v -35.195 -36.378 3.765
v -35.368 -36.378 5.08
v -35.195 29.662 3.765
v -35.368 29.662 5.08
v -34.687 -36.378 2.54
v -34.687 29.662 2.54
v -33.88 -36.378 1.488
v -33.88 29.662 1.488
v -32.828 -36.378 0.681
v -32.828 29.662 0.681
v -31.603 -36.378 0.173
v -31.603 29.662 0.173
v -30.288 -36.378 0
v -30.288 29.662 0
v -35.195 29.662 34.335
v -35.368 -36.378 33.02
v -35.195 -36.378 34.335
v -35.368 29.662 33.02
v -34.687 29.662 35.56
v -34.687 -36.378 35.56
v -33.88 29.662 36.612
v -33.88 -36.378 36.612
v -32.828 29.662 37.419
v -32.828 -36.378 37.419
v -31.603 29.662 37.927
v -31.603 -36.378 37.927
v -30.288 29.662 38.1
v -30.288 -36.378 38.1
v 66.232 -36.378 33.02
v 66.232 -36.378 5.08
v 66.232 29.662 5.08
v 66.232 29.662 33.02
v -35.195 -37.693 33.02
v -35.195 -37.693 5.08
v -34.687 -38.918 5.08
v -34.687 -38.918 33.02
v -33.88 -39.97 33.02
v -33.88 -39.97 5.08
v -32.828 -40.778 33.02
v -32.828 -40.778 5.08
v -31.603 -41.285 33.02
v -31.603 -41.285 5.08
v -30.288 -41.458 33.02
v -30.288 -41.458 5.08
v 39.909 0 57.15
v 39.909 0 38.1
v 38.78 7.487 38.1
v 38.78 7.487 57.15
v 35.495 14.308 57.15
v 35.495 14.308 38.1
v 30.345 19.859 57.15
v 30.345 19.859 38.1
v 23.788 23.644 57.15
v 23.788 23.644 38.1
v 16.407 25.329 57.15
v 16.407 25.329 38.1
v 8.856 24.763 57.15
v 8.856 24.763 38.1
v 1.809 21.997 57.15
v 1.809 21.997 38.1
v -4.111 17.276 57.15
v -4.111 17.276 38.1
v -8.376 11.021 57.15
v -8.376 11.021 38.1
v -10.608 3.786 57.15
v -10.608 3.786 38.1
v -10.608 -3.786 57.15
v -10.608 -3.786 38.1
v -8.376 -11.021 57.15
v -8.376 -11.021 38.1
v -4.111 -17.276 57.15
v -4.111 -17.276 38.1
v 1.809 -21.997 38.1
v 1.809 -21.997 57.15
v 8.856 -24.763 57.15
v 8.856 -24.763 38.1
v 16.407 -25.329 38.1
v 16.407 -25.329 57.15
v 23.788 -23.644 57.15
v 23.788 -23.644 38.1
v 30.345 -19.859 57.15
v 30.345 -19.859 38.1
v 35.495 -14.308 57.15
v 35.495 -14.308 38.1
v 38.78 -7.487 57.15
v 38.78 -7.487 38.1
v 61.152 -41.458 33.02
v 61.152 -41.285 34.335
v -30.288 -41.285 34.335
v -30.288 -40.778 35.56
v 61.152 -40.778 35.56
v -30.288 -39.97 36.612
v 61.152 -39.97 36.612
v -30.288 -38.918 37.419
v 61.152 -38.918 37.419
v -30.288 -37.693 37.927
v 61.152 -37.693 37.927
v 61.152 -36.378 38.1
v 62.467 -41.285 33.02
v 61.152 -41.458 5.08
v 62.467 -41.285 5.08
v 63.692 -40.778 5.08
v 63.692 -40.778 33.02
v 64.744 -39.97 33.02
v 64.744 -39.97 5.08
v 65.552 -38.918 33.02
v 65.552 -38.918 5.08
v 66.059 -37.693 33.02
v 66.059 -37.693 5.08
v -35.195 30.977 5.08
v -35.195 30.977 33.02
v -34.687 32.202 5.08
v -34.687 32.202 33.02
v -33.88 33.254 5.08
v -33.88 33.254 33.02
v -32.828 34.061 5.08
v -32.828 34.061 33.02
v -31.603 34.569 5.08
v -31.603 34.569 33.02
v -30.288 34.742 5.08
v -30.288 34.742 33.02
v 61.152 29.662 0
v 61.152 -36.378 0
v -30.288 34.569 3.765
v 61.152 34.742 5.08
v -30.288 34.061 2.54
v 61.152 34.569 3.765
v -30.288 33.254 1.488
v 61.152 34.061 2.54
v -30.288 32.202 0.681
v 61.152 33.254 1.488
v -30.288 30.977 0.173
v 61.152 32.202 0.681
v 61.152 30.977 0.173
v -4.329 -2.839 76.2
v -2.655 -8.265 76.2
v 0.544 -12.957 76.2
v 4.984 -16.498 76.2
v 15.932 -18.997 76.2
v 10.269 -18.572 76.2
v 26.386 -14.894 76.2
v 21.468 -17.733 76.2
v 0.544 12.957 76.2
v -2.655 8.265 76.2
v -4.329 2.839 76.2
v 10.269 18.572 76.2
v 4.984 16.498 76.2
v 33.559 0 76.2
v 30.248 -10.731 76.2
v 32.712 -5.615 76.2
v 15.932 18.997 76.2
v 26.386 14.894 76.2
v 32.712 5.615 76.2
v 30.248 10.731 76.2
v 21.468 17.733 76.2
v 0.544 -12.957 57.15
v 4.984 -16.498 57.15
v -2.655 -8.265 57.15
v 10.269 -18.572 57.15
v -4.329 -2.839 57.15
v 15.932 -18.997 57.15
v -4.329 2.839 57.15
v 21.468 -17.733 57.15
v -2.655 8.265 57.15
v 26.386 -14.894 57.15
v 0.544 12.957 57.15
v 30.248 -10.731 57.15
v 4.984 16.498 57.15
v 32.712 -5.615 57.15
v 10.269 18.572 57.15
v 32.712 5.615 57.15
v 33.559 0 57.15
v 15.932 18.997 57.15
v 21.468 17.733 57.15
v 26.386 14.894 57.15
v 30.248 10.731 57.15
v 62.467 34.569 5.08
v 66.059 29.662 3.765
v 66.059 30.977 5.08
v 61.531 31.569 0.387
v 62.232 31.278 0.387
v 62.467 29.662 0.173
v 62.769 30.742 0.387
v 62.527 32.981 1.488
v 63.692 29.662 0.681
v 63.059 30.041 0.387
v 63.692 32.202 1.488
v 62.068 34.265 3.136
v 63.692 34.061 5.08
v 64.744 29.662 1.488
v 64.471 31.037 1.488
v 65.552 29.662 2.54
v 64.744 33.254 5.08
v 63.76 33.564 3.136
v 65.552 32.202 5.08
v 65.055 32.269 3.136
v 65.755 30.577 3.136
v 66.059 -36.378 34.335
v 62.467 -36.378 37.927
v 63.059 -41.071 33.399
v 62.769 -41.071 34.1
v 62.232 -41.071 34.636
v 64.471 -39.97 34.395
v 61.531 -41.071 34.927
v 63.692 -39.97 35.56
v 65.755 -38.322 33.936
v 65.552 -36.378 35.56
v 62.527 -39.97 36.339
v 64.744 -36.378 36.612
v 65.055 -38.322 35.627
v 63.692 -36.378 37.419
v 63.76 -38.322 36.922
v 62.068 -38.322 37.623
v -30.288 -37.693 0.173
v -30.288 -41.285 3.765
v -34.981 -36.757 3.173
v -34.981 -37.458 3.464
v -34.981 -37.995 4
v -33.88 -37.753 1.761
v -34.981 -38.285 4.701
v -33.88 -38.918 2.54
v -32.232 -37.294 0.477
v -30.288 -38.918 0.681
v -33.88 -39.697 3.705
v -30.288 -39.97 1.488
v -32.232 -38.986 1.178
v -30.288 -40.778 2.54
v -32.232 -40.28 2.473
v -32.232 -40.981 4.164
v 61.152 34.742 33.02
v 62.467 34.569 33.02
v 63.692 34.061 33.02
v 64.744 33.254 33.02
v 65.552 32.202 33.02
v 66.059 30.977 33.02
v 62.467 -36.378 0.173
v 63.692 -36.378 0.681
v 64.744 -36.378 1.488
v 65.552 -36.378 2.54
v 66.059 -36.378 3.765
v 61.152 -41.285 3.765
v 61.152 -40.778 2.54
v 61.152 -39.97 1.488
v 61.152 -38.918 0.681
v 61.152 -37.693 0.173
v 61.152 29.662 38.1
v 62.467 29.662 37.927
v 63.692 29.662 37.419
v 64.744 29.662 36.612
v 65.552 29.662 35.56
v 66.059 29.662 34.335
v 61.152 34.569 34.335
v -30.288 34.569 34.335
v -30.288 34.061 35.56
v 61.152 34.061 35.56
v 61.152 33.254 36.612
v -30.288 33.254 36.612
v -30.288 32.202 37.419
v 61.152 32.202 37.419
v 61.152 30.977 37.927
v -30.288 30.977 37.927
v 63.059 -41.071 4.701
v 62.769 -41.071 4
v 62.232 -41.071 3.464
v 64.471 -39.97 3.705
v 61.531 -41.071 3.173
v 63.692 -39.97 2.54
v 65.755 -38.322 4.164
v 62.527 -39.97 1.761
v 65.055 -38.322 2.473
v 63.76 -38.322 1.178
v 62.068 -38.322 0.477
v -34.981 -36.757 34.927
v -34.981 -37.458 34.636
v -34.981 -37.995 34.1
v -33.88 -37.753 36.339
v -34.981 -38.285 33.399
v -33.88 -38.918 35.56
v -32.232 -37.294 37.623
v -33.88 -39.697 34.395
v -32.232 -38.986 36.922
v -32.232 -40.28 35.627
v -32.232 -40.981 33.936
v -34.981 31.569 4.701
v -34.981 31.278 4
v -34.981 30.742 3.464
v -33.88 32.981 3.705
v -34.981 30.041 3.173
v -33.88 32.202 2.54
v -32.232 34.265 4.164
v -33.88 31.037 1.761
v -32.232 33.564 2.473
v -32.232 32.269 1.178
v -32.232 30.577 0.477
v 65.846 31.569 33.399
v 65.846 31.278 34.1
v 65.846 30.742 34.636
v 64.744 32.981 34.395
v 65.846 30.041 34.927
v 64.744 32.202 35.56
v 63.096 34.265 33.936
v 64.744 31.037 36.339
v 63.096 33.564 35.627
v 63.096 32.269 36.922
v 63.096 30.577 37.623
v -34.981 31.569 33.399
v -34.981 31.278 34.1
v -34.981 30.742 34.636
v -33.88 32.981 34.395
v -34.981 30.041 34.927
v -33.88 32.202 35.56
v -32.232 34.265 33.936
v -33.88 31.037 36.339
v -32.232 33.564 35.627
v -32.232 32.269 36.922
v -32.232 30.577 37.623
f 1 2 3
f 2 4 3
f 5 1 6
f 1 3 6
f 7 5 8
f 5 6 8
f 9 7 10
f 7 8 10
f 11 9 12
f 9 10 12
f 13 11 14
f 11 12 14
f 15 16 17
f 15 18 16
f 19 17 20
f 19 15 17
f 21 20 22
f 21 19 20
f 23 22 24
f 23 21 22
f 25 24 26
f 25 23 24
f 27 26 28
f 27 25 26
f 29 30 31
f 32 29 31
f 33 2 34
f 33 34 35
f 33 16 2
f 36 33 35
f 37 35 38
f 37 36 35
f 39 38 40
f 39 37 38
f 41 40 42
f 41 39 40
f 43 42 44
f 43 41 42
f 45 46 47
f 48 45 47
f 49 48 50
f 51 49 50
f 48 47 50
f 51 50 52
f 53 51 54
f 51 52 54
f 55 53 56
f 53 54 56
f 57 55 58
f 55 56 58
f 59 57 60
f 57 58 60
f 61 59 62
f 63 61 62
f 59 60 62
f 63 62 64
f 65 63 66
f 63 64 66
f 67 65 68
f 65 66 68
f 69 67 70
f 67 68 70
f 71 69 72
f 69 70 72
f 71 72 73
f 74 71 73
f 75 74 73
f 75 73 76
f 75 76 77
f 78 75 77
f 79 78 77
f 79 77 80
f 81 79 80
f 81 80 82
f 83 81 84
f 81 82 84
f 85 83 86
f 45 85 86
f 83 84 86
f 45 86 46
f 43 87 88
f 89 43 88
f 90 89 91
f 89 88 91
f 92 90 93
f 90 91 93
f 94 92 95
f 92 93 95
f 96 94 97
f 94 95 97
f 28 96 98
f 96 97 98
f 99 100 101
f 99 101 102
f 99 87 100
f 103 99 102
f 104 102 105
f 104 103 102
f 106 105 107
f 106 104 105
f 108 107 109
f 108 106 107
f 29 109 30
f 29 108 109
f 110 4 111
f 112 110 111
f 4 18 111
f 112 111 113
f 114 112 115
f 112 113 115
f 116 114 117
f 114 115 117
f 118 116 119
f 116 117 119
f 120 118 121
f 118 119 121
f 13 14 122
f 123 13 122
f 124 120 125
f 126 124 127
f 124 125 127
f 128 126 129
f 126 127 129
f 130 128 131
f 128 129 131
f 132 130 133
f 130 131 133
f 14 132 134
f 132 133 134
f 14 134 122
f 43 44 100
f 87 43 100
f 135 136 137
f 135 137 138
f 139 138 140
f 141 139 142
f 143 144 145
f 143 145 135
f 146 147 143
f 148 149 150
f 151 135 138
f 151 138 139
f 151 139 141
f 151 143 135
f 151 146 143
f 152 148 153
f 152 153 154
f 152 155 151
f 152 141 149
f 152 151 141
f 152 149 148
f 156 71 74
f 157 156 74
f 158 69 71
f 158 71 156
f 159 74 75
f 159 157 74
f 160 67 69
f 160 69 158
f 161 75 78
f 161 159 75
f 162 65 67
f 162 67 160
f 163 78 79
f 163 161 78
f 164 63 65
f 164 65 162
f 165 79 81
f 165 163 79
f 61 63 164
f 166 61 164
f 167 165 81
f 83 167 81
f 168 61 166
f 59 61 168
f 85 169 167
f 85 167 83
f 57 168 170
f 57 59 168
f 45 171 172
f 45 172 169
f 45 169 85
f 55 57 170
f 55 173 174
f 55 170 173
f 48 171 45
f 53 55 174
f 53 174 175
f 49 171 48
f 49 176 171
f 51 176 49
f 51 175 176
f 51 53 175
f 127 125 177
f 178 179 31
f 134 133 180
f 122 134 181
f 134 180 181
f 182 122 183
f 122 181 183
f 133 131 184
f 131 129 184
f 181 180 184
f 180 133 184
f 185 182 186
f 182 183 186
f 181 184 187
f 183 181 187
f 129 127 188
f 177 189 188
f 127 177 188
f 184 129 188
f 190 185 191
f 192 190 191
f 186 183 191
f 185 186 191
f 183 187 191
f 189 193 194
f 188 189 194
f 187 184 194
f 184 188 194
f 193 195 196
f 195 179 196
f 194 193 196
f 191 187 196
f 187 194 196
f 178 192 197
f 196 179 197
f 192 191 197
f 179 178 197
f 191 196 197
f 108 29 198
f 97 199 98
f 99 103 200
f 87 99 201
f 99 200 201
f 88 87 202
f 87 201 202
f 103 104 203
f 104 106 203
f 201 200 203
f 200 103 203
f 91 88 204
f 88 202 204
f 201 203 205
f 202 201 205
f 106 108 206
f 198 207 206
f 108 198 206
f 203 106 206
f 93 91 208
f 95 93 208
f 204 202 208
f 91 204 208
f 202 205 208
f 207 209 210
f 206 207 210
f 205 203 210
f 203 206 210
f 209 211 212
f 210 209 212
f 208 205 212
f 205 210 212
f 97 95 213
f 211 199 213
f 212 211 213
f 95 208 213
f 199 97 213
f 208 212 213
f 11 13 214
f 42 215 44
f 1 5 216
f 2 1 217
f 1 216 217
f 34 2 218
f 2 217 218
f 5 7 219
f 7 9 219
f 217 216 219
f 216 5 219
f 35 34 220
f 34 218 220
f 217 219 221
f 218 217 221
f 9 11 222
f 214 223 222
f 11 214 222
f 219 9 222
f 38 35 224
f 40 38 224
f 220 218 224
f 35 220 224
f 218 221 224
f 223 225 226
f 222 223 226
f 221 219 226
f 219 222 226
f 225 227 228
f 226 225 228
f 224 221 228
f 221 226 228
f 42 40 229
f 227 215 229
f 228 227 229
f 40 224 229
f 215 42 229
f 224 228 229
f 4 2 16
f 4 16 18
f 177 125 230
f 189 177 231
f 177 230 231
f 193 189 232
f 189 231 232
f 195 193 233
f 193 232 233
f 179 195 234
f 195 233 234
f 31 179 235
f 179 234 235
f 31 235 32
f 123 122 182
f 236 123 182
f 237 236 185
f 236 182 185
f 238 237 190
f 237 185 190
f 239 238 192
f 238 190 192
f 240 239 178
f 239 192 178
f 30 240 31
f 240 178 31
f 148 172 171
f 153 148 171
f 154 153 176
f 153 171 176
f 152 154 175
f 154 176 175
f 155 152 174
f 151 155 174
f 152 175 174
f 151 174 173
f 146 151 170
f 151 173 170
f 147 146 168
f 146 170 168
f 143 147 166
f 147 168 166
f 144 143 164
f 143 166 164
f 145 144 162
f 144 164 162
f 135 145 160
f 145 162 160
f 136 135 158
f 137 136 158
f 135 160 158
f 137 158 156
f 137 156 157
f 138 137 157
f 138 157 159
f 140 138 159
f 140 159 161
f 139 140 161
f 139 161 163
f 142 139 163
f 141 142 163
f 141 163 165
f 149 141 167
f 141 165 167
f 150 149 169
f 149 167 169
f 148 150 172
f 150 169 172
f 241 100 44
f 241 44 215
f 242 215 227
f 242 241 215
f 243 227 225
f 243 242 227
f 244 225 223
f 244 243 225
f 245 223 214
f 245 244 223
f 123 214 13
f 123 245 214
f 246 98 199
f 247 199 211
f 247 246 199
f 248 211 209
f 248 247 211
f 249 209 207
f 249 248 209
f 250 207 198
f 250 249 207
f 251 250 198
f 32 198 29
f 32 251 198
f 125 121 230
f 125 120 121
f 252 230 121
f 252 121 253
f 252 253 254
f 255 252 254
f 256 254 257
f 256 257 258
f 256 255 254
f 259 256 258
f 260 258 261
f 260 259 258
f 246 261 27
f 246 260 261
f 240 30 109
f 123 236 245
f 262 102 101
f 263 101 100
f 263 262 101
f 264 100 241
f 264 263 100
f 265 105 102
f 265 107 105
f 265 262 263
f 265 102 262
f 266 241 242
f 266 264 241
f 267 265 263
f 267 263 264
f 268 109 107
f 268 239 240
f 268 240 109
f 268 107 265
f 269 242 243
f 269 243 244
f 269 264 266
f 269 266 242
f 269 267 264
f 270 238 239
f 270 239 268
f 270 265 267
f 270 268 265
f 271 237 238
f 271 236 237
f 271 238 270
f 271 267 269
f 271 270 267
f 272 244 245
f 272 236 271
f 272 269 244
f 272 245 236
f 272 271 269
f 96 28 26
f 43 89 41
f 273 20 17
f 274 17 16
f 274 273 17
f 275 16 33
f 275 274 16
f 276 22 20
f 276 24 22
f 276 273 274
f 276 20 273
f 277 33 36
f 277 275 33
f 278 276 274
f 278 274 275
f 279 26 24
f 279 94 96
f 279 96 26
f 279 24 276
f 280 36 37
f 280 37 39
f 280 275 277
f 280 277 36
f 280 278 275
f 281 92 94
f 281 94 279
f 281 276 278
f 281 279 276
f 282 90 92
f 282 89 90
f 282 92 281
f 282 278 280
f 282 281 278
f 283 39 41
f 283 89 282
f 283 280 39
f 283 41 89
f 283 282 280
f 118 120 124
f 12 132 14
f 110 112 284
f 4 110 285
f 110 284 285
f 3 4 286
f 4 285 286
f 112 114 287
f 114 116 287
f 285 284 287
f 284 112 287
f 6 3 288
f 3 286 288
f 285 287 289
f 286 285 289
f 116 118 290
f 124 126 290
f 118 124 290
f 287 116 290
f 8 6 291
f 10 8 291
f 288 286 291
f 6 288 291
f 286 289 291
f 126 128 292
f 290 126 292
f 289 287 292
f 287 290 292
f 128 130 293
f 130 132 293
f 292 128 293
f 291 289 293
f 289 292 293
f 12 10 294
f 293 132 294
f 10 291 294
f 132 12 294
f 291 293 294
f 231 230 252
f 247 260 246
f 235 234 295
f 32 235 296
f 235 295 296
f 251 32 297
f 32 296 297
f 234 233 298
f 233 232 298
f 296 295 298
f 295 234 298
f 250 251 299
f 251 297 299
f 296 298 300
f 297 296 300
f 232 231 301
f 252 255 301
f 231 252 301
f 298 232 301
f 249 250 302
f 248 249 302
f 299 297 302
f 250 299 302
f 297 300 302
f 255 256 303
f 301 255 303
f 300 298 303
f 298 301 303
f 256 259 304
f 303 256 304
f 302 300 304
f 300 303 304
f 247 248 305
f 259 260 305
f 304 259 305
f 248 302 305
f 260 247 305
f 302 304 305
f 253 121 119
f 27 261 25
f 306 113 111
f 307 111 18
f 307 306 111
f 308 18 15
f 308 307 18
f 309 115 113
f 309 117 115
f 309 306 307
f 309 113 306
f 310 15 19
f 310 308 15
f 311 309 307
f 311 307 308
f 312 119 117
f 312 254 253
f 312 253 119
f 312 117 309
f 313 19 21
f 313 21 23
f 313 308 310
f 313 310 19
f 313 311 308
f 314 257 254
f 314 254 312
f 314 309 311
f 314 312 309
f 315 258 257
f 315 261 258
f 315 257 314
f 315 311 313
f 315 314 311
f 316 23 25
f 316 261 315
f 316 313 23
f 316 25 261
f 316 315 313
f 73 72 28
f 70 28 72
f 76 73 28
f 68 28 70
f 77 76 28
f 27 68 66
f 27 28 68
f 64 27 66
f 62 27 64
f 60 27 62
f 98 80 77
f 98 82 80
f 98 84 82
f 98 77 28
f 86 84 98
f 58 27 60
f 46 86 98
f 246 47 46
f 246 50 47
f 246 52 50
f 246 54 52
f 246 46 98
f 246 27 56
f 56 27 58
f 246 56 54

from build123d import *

# Parameters (mm, degrees)
F0_W     = 101.6
F0_H     = 76.2
F1_DEPTH = 38.1
F2_R     = 25.4
F3_DEPTH = 19.05
F4_R     = 19.05
F5_DEPTH = 19.05
F6_R     = 5.08


with BuildPart() as f1:
    # F0 (on Top) → F1 (new body)
    with BuildSketch(Plane.XY):
        with Locations((15.432196, -3.358119)):
            Rectangle(F0_W, F0_H)
    extrude(amount=F1_DEPTH)

    # F2 (on face) → F3 (join)
    with BuildSketch(Plane.XY.offset(38.1)):
        with Locations((14.508507, 0)):
            Circle(F2_R)
    extrude(amount=F3_DEPTH)

    # F4 (on face) → F5 (join)
    with BuildSketch(Plane.XY.offset(57.15)):
        with Locations((14.508507, 0)):
            Circle(F4_R)
    extrude(amount=F5_DEPTH)

    # F6
    f6_edges = [f1.edges().sort_by_distance(p)[0] for p in [
        (15.432196, 34.741881, 38.1),
        (66.232196, 34.741881, 19.05),
        (15.432196, 34.741881, 0),
        (-35.367804, 34.741881, 19.05),
        (66.232196, -3.358119, 38.1),
        (66.232196, -3.358119, 0),
        (66.232196, -41.458119, 19.05),
        (15.432196, -41.458119, 38.1),
        (-35.367804, -3.358119, 38.1),
        (15.432196, -41.458119, 0),
        (-35.367804, -3.358119, 0),
        (-35.367804, -41.458119, 19.05),
    ]]
    fillet(f6_edges, radius=F6_R)


solid = f1.part
